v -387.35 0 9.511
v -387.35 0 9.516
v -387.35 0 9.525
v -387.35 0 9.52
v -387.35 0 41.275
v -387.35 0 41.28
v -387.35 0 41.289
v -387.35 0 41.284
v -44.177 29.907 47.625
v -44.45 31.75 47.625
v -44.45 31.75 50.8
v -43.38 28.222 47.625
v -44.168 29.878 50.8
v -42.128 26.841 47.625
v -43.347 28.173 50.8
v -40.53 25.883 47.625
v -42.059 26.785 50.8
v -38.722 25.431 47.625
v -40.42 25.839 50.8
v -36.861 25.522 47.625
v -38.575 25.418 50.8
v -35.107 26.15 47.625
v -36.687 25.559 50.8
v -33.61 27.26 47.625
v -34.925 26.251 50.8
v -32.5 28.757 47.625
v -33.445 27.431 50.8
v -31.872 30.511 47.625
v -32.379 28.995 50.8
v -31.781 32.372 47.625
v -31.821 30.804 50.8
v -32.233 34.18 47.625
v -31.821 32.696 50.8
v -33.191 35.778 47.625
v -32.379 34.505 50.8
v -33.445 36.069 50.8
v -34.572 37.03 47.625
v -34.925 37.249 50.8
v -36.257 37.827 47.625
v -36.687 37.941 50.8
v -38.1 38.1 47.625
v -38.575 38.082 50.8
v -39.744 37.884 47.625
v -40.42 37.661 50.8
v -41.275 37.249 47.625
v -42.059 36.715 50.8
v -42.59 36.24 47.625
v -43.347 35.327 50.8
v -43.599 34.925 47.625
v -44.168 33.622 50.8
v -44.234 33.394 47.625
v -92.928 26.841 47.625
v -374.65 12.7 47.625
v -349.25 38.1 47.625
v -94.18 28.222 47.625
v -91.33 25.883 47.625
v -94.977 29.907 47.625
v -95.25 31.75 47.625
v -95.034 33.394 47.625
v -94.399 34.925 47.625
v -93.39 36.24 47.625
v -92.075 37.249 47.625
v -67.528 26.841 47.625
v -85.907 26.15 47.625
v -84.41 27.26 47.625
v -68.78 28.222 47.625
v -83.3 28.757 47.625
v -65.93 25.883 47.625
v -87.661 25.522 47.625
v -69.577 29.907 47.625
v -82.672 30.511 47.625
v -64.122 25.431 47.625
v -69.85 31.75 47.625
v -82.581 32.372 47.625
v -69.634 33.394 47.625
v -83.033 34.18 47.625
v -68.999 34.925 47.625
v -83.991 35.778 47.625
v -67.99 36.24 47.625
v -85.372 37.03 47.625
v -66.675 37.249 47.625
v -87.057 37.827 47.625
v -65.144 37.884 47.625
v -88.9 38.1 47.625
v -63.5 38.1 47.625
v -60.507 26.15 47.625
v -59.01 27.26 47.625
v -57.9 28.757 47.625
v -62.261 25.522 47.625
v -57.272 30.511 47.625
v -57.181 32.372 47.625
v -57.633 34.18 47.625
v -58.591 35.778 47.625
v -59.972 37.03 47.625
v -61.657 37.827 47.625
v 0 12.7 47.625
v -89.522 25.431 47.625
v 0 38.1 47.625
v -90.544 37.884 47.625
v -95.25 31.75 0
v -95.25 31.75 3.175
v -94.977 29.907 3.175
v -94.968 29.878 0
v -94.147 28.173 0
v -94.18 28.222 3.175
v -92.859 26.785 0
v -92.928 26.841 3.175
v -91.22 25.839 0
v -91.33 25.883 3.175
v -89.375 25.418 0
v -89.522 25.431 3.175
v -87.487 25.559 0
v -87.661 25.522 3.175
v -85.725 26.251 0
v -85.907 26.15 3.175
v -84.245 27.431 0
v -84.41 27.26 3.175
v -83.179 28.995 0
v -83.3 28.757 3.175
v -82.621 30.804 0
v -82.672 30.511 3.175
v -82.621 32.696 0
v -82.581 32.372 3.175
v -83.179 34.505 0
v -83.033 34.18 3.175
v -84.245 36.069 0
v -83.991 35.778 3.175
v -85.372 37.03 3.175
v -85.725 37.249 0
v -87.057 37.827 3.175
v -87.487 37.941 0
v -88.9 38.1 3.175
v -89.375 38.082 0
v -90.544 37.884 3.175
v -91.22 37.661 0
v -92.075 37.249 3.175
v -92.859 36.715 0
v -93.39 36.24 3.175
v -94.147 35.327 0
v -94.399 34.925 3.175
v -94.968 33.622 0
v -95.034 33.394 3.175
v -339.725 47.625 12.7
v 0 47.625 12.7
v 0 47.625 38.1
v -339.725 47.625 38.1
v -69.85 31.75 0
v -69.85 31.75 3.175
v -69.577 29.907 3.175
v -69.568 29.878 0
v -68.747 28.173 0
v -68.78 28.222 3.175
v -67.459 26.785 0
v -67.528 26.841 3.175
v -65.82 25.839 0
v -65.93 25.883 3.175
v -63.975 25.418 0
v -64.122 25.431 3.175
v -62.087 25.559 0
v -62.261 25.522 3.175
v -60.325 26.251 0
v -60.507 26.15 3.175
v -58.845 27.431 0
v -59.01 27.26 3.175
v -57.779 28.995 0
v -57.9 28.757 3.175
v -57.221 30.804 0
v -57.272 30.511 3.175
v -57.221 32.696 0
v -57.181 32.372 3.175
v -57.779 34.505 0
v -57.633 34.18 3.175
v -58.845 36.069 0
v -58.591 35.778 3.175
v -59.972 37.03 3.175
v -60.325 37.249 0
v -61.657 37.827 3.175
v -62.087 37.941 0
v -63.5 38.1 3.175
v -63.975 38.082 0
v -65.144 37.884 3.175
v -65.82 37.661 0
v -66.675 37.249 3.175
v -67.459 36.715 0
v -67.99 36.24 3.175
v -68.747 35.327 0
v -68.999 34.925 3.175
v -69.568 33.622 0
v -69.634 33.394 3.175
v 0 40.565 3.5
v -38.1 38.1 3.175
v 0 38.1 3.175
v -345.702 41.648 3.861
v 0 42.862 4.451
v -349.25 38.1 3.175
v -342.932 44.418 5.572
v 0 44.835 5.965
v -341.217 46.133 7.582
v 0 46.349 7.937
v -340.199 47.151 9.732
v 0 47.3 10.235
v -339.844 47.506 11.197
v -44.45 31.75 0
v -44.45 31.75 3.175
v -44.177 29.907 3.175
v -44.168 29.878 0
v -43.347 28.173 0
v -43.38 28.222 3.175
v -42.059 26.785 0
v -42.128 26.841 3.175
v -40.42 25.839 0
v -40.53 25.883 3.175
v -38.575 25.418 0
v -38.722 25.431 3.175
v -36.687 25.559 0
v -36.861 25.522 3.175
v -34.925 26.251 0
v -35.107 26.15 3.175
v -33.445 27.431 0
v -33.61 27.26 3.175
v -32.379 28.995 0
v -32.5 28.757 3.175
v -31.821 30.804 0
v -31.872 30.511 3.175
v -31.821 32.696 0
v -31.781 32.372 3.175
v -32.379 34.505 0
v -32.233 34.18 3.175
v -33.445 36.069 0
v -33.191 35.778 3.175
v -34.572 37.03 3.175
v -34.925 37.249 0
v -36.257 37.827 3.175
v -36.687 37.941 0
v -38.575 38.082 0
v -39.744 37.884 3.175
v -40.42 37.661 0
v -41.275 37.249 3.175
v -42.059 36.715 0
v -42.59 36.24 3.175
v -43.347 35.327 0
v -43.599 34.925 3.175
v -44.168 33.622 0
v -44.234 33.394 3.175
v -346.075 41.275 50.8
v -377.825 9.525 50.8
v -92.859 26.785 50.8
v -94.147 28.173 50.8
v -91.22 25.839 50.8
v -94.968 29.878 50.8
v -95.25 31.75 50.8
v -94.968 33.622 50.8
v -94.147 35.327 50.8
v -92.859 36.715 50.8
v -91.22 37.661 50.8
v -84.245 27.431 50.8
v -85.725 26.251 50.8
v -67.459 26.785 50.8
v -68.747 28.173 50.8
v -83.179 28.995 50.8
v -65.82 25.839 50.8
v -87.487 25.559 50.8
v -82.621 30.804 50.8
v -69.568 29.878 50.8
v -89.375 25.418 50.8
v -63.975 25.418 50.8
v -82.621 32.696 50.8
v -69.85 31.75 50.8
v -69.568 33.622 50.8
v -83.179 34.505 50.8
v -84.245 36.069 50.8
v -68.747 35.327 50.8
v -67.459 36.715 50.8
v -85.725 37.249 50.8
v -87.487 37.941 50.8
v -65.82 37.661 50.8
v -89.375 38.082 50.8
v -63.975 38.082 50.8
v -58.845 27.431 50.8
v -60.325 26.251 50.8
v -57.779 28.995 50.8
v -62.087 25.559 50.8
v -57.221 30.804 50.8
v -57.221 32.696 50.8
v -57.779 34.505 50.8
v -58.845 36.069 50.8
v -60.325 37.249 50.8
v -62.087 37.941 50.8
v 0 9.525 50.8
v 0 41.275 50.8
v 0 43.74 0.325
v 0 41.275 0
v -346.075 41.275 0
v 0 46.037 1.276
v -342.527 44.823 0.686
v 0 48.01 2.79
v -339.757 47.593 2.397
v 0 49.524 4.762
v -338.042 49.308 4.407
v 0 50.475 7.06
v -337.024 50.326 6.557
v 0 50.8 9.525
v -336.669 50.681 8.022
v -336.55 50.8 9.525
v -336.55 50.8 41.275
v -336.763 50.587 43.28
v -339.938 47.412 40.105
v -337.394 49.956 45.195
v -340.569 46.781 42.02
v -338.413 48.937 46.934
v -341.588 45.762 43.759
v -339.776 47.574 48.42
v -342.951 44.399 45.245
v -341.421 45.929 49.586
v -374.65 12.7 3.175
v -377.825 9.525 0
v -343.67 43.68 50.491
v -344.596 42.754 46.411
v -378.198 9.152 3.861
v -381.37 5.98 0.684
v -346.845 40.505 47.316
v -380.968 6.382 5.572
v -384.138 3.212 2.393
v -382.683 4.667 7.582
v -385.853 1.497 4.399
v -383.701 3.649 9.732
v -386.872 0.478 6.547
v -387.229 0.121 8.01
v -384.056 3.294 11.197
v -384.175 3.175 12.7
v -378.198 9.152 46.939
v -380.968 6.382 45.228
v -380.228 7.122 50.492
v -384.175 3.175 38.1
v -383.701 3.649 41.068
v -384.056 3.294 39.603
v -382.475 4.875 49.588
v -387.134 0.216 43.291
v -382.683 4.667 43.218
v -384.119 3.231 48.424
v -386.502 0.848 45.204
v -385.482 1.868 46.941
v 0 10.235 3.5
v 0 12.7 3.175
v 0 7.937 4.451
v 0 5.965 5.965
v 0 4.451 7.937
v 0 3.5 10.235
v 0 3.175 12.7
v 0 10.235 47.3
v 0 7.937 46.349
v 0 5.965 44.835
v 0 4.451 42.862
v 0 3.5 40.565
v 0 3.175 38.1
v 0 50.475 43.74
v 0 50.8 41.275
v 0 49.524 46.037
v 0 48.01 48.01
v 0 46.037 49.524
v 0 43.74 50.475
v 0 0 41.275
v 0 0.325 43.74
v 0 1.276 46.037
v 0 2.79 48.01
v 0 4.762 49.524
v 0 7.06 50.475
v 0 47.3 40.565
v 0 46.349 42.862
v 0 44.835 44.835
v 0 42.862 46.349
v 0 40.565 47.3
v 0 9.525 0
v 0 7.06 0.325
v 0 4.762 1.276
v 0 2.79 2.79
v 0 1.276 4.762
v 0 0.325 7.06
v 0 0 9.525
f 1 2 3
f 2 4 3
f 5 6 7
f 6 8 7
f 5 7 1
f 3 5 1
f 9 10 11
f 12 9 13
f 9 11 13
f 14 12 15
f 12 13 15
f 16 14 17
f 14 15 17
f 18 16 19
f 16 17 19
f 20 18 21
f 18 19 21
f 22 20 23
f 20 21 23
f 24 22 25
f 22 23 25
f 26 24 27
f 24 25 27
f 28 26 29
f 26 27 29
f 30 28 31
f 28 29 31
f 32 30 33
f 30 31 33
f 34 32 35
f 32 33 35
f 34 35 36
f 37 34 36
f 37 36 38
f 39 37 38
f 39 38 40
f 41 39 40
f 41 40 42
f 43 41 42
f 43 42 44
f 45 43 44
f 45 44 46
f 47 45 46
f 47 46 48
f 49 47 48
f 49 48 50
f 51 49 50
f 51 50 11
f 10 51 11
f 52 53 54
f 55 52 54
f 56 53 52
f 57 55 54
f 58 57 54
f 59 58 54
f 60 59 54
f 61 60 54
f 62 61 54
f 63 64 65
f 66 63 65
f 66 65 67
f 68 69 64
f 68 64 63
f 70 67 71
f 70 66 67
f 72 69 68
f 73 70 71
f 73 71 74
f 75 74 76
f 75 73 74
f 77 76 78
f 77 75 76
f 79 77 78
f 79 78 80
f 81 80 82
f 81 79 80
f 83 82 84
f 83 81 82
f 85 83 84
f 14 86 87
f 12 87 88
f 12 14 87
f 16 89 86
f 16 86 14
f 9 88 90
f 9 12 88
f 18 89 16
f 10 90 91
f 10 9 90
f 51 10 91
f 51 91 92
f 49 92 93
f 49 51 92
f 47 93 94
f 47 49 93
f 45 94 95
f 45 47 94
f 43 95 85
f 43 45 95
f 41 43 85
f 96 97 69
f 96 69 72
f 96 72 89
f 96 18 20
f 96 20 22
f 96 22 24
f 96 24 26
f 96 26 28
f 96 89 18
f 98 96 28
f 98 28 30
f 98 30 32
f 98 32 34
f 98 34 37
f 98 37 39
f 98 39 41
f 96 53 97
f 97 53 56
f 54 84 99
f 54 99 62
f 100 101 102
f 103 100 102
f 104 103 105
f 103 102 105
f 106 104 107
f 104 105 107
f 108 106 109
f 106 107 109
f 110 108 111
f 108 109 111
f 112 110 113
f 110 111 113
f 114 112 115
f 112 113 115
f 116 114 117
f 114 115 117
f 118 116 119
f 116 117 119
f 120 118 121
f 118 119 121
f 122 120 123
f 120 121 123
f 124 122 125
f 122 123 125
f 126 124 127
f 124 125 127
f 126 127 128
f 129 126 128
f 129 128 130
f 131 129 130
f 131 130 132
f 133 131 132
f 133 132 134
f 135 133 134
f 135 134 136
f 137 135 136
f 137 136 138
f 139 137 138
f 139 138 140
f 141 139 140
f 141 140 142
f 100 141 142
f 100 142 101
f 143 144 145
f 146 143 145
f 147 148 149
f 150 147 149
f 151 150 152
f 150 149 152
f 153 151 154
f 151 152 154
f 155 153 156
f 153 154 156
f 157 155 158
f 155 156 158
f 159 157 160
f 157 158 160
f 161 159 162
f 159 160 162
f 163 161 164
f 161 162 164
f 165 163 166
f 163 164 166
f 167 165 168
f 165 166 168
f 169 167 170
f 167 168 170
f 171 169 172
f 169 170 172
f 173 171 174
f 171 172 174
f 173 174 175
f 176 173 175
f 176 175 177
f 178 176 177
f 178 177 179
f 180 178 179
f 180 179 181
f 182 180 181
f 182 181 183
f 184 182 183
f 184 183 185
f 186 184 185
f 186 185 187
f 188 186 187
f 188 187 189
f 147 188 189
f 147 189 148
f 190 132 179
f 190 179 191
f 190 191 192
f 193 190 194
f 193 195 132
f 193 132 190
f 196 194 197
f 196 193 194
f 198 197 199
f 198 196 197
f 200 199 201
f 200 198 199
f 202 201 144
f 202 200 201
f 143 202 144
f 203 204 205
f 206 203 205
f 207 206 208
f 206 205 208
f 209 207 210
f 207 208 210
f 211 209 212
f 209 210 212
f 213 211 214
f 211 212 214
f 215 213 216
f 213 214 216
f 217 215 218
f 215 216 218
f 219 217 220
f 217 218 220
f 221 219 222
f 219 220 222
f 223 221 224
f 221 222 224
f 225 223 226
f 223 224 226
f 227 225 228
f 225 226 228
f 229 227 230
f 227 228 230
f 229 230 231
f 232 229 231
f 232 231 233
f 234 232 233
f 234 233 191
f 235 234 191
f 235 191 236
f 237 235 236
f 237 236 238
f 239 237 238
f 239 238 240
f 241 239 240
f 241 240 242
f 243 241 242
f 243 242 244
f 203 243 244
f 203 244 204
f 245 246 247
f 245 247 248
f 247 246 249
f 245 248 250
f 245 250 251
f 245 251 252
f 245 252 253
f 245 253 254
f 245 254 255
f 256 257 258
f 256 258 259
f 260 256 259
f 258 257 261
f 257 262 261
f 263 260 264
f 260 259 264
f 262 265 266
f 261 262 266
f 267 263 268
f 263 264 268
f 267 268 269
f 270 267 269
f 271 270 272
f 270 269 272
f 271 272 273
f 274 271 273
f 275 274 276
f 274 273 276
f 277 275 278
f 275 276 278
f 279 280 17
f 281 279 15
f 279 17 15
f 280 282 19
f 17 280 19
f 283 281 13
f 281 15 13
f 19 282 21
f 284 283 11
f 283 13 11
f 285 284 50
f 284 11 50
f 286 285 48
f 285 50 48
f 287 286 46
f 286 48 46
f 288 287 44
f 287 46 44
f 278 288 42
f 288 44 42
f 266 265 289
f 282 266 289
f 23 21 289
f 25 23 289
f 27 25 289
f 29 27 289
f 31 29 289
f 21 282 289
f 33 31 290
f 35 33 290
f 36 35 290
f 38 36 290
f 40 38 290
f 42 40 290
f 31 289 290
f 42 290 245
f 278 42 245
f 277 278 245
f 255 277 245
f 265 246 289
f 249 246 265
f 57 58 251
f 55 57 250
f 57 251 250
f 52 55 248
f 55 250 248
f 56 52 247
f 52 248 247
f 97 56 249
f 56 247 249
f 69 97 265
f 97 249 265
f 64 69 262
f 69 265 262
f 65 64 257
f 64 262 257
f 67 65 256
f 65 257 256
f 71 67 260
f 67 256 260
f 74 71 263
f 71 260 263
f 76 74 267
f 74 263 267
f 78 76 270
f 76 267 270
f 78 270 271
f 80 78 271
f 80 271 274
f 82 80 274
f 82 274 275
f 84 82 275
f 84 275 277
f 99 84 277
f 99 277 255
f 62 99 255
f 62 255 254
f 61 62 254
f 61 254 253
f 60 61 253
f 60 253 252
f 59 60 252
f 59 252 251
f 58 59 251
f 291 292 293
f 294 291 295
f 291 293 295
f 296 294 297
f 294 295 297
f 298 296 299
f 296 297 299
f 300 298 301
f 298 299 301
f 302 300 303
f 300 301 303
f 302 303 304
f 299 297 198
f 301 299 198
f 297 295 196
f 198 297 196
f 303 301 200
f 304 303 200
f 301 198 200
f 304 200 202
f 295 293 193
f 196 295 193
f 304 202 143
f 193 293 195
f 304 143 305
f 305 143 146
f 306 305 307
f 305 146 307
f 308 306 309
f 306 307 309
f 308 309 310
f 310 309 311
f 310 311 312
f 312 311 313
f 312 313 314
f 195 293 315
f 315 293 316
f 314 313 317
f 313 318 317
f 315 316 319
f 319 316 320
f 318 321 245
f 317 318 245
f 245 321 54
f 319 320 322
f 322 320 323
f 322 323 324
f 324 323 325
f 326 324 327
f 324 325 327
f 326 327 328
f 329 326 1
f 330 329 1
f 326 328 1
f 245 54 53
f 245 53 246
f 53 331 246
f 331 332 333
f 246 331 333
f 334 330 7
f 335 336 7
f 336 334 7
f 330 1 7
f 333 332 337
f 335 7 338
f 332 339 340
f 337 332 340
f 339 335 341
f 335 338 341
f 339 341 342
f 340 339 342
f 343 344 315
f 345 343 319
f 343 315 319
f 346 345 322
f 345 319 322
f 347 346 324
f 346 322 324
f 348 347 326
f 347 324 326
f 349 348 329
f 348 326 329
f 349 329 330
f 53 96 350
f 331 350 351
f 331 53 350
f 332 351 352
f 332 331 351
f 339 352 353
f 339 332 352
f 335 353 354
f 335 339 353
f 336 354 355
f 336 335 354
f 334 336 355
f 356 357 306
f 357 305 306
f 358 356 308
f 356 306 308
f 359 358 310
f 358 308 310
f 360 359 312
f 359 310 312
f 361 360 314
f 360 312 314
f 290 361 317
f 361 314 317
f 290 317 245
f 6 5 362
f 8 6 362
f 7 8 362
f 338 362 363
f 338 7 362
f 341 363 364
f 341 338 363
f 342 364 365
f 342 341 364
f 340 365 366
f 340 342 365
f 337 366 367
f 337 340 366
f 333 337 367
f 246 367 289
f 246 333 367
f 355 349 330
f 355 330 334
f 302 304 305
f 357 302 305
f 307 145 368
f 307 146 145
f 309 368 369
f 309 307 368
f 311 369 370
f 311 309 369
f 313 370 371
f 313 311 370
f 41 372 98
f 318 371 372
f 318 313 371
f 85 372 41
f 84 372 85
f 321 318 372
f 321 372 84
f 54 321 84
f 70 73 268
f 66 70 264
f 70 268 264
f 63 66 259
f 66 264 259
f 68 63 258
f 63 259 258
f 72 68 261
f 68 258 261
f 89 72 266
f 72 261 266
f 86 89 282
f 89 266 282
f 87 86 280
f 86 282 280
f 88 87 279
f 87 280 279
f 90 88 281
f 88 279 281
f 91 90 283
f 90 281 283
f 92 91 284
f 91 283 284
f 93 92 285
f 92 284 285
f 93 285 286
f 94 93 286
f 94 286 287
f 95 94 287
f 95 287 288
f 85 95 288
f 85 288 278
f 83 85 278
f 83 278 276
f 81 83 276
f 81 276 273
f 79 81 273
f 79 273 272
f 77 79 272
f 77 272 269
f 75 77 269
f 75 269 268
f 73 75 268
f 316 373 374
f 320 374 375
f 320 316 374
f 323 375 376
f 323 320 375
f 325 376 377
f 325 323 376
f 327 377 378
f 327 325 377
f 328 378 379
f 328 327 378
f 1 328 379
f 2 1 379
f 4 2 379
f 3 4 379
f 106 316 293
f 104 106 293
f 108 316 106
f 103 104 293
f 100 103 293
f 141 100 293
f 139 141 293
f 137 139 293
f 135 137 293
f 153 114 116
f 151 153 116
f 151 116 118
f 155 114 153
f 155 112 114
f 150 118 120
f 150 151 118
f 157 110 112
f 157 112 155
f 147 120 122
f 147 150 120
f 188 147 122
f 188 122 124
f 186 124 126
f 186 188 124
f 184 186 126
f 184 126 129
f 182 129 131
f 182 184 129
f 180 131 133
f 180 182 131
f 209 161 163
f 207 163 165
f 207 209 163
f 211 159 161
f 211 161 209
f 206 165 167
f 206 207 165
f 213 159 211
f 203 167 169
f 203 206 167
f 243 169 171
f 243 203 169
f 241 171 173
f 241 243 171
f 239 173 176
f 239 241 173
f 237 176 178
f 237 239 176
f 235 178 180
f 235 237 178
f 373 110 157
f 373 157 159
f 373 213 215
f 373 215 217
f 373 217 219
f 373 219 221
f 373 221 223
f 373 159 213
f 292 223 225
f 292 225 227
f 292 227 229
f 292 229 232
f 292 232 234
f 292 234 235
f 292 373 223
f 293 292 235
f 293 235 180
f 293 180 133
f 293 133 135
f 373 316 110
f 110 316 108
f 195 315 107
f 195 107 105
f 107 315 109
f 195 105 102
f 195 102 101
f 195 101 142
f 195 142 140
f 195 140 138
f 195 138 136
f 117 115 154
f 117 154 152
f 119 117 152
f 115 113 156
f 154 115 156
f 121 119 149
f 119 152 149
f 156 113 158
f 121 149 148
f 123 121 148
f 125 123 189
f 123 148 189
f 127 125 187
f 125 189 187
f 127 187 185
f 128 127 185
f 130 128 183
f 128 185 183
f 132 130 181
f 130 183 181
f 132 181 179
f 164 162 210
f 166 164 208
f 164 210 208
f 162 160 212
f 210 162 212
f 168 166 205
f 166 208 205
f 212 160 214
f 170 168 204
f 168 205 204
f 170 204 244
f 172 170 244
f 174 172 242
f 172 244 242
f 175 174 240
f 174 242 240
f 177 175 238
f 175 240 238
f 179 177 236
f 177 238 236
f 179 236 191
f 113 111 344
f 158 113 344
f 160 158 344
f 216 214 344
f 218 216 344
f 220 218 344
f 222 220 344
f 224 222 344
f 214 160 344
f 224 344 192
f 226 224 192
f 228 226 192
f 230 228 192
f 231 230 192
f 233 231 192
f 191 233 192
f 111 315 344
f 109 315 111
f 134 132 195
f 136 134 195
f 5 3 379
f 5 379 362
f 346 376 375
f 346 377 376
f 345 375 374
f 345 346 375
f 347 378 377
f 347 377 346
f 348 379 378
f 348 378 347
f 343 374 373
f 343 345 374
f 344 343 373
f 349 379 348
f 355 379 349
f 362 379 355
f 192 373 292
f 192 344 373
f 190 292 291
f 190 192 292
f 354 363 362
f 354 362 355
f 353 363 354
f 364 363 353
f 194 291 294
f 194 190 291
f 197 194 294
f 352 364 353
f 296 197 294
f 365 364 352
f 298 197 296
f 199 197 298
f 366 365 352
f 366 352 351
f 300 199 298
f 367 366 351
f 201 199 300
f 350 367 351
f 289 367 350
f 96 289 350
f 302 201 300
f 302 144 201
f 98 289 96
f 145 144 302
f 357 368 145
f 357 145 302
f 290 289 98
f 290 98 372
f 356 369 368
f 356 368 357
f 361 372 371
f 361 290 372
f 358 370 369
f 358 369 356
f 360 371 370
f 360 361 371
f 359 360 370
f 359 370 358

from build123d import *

# Parameters (mm, degrees)
F0_W     = 50.8
F0_H     = 50.8
F1_DEPTH = 387.35
F2_SIZE  = 50.79999
F3_W     = 44.45
F3_H     = 44.45
F4_DEPTH = 876.3
F5_R     = 9.525
F7_D     = 12.7
F7_DEPTH = 127
F7_TIP   = 3.8154649308


# Not quite as in the source:
# - a fillet or chamfer is up to 0.001 mm smaller than in the source, because OpenCascade refuses the exact size


with BuildPart() as f1:
    # F0 (on Right) → F1 (new body)
    with BuildSketch(Plane.YZ):
        with Locations((25.4, 25.4)):
            Rectangle(F0_W, F0_H)
    extrude(amount=-F1_DEPTH)

    # F2 (size 50.8 in the source; OpenCascade refuses exactly that, so slightly less here)
    f2_edges = [f1.edges().sort_by_distance(p)[0] for p in [
        (-387.35, 50.8, 25.4),
    ]]
    chamfer(f2_edges, length=F2_SIZE)

    # F3 (on face) → F4 (cut)
    with BuildSketch(Plane.YZ):
        with Locations((25.4, 25.4)):
            Rectangle(F3_W, F3_H)
    extrude(amount=-F4_DEPTH, mode=Mode.SUBTRACT)

    # F5
    f5_edges = [f1.edges().sort_by_distance(p)[0] for p in [
        (-192.087505, 3.175, 3.175),
        (-169.862505, 47.625, 3.175),
        (-169.862505, 47.625, 47.625),
        (-192.087505, 3.175, 47.625),
        (-168.275005, 50.8, 0),
        (-168.275005, 50.8, 50.8),
        (-193.675, 0, 50.8),
        (-193.675, 0, 0),
    ]]
    fillet(f5_edges, radius=F5_R)

    # F7
    with Locations(Plane(origin=(0, 0, 0), x_dir=(1, 0, 0), z_dir=(0, 0, -1))):
        with Locations((-38.1, -31.75), (-63.5, -31.75), (-88.9, -31.75)):
            Hole(F7_D / 2, depth=F7_DEPTH)
            with Locations((0, 0, -(F7_DEPTH + F7_TIP / 2))):  # 118° drill point
                Cone(0, F7_D / 2, F7_TIP, mode=Mode.SUBTRACT)


solid = f1.part
